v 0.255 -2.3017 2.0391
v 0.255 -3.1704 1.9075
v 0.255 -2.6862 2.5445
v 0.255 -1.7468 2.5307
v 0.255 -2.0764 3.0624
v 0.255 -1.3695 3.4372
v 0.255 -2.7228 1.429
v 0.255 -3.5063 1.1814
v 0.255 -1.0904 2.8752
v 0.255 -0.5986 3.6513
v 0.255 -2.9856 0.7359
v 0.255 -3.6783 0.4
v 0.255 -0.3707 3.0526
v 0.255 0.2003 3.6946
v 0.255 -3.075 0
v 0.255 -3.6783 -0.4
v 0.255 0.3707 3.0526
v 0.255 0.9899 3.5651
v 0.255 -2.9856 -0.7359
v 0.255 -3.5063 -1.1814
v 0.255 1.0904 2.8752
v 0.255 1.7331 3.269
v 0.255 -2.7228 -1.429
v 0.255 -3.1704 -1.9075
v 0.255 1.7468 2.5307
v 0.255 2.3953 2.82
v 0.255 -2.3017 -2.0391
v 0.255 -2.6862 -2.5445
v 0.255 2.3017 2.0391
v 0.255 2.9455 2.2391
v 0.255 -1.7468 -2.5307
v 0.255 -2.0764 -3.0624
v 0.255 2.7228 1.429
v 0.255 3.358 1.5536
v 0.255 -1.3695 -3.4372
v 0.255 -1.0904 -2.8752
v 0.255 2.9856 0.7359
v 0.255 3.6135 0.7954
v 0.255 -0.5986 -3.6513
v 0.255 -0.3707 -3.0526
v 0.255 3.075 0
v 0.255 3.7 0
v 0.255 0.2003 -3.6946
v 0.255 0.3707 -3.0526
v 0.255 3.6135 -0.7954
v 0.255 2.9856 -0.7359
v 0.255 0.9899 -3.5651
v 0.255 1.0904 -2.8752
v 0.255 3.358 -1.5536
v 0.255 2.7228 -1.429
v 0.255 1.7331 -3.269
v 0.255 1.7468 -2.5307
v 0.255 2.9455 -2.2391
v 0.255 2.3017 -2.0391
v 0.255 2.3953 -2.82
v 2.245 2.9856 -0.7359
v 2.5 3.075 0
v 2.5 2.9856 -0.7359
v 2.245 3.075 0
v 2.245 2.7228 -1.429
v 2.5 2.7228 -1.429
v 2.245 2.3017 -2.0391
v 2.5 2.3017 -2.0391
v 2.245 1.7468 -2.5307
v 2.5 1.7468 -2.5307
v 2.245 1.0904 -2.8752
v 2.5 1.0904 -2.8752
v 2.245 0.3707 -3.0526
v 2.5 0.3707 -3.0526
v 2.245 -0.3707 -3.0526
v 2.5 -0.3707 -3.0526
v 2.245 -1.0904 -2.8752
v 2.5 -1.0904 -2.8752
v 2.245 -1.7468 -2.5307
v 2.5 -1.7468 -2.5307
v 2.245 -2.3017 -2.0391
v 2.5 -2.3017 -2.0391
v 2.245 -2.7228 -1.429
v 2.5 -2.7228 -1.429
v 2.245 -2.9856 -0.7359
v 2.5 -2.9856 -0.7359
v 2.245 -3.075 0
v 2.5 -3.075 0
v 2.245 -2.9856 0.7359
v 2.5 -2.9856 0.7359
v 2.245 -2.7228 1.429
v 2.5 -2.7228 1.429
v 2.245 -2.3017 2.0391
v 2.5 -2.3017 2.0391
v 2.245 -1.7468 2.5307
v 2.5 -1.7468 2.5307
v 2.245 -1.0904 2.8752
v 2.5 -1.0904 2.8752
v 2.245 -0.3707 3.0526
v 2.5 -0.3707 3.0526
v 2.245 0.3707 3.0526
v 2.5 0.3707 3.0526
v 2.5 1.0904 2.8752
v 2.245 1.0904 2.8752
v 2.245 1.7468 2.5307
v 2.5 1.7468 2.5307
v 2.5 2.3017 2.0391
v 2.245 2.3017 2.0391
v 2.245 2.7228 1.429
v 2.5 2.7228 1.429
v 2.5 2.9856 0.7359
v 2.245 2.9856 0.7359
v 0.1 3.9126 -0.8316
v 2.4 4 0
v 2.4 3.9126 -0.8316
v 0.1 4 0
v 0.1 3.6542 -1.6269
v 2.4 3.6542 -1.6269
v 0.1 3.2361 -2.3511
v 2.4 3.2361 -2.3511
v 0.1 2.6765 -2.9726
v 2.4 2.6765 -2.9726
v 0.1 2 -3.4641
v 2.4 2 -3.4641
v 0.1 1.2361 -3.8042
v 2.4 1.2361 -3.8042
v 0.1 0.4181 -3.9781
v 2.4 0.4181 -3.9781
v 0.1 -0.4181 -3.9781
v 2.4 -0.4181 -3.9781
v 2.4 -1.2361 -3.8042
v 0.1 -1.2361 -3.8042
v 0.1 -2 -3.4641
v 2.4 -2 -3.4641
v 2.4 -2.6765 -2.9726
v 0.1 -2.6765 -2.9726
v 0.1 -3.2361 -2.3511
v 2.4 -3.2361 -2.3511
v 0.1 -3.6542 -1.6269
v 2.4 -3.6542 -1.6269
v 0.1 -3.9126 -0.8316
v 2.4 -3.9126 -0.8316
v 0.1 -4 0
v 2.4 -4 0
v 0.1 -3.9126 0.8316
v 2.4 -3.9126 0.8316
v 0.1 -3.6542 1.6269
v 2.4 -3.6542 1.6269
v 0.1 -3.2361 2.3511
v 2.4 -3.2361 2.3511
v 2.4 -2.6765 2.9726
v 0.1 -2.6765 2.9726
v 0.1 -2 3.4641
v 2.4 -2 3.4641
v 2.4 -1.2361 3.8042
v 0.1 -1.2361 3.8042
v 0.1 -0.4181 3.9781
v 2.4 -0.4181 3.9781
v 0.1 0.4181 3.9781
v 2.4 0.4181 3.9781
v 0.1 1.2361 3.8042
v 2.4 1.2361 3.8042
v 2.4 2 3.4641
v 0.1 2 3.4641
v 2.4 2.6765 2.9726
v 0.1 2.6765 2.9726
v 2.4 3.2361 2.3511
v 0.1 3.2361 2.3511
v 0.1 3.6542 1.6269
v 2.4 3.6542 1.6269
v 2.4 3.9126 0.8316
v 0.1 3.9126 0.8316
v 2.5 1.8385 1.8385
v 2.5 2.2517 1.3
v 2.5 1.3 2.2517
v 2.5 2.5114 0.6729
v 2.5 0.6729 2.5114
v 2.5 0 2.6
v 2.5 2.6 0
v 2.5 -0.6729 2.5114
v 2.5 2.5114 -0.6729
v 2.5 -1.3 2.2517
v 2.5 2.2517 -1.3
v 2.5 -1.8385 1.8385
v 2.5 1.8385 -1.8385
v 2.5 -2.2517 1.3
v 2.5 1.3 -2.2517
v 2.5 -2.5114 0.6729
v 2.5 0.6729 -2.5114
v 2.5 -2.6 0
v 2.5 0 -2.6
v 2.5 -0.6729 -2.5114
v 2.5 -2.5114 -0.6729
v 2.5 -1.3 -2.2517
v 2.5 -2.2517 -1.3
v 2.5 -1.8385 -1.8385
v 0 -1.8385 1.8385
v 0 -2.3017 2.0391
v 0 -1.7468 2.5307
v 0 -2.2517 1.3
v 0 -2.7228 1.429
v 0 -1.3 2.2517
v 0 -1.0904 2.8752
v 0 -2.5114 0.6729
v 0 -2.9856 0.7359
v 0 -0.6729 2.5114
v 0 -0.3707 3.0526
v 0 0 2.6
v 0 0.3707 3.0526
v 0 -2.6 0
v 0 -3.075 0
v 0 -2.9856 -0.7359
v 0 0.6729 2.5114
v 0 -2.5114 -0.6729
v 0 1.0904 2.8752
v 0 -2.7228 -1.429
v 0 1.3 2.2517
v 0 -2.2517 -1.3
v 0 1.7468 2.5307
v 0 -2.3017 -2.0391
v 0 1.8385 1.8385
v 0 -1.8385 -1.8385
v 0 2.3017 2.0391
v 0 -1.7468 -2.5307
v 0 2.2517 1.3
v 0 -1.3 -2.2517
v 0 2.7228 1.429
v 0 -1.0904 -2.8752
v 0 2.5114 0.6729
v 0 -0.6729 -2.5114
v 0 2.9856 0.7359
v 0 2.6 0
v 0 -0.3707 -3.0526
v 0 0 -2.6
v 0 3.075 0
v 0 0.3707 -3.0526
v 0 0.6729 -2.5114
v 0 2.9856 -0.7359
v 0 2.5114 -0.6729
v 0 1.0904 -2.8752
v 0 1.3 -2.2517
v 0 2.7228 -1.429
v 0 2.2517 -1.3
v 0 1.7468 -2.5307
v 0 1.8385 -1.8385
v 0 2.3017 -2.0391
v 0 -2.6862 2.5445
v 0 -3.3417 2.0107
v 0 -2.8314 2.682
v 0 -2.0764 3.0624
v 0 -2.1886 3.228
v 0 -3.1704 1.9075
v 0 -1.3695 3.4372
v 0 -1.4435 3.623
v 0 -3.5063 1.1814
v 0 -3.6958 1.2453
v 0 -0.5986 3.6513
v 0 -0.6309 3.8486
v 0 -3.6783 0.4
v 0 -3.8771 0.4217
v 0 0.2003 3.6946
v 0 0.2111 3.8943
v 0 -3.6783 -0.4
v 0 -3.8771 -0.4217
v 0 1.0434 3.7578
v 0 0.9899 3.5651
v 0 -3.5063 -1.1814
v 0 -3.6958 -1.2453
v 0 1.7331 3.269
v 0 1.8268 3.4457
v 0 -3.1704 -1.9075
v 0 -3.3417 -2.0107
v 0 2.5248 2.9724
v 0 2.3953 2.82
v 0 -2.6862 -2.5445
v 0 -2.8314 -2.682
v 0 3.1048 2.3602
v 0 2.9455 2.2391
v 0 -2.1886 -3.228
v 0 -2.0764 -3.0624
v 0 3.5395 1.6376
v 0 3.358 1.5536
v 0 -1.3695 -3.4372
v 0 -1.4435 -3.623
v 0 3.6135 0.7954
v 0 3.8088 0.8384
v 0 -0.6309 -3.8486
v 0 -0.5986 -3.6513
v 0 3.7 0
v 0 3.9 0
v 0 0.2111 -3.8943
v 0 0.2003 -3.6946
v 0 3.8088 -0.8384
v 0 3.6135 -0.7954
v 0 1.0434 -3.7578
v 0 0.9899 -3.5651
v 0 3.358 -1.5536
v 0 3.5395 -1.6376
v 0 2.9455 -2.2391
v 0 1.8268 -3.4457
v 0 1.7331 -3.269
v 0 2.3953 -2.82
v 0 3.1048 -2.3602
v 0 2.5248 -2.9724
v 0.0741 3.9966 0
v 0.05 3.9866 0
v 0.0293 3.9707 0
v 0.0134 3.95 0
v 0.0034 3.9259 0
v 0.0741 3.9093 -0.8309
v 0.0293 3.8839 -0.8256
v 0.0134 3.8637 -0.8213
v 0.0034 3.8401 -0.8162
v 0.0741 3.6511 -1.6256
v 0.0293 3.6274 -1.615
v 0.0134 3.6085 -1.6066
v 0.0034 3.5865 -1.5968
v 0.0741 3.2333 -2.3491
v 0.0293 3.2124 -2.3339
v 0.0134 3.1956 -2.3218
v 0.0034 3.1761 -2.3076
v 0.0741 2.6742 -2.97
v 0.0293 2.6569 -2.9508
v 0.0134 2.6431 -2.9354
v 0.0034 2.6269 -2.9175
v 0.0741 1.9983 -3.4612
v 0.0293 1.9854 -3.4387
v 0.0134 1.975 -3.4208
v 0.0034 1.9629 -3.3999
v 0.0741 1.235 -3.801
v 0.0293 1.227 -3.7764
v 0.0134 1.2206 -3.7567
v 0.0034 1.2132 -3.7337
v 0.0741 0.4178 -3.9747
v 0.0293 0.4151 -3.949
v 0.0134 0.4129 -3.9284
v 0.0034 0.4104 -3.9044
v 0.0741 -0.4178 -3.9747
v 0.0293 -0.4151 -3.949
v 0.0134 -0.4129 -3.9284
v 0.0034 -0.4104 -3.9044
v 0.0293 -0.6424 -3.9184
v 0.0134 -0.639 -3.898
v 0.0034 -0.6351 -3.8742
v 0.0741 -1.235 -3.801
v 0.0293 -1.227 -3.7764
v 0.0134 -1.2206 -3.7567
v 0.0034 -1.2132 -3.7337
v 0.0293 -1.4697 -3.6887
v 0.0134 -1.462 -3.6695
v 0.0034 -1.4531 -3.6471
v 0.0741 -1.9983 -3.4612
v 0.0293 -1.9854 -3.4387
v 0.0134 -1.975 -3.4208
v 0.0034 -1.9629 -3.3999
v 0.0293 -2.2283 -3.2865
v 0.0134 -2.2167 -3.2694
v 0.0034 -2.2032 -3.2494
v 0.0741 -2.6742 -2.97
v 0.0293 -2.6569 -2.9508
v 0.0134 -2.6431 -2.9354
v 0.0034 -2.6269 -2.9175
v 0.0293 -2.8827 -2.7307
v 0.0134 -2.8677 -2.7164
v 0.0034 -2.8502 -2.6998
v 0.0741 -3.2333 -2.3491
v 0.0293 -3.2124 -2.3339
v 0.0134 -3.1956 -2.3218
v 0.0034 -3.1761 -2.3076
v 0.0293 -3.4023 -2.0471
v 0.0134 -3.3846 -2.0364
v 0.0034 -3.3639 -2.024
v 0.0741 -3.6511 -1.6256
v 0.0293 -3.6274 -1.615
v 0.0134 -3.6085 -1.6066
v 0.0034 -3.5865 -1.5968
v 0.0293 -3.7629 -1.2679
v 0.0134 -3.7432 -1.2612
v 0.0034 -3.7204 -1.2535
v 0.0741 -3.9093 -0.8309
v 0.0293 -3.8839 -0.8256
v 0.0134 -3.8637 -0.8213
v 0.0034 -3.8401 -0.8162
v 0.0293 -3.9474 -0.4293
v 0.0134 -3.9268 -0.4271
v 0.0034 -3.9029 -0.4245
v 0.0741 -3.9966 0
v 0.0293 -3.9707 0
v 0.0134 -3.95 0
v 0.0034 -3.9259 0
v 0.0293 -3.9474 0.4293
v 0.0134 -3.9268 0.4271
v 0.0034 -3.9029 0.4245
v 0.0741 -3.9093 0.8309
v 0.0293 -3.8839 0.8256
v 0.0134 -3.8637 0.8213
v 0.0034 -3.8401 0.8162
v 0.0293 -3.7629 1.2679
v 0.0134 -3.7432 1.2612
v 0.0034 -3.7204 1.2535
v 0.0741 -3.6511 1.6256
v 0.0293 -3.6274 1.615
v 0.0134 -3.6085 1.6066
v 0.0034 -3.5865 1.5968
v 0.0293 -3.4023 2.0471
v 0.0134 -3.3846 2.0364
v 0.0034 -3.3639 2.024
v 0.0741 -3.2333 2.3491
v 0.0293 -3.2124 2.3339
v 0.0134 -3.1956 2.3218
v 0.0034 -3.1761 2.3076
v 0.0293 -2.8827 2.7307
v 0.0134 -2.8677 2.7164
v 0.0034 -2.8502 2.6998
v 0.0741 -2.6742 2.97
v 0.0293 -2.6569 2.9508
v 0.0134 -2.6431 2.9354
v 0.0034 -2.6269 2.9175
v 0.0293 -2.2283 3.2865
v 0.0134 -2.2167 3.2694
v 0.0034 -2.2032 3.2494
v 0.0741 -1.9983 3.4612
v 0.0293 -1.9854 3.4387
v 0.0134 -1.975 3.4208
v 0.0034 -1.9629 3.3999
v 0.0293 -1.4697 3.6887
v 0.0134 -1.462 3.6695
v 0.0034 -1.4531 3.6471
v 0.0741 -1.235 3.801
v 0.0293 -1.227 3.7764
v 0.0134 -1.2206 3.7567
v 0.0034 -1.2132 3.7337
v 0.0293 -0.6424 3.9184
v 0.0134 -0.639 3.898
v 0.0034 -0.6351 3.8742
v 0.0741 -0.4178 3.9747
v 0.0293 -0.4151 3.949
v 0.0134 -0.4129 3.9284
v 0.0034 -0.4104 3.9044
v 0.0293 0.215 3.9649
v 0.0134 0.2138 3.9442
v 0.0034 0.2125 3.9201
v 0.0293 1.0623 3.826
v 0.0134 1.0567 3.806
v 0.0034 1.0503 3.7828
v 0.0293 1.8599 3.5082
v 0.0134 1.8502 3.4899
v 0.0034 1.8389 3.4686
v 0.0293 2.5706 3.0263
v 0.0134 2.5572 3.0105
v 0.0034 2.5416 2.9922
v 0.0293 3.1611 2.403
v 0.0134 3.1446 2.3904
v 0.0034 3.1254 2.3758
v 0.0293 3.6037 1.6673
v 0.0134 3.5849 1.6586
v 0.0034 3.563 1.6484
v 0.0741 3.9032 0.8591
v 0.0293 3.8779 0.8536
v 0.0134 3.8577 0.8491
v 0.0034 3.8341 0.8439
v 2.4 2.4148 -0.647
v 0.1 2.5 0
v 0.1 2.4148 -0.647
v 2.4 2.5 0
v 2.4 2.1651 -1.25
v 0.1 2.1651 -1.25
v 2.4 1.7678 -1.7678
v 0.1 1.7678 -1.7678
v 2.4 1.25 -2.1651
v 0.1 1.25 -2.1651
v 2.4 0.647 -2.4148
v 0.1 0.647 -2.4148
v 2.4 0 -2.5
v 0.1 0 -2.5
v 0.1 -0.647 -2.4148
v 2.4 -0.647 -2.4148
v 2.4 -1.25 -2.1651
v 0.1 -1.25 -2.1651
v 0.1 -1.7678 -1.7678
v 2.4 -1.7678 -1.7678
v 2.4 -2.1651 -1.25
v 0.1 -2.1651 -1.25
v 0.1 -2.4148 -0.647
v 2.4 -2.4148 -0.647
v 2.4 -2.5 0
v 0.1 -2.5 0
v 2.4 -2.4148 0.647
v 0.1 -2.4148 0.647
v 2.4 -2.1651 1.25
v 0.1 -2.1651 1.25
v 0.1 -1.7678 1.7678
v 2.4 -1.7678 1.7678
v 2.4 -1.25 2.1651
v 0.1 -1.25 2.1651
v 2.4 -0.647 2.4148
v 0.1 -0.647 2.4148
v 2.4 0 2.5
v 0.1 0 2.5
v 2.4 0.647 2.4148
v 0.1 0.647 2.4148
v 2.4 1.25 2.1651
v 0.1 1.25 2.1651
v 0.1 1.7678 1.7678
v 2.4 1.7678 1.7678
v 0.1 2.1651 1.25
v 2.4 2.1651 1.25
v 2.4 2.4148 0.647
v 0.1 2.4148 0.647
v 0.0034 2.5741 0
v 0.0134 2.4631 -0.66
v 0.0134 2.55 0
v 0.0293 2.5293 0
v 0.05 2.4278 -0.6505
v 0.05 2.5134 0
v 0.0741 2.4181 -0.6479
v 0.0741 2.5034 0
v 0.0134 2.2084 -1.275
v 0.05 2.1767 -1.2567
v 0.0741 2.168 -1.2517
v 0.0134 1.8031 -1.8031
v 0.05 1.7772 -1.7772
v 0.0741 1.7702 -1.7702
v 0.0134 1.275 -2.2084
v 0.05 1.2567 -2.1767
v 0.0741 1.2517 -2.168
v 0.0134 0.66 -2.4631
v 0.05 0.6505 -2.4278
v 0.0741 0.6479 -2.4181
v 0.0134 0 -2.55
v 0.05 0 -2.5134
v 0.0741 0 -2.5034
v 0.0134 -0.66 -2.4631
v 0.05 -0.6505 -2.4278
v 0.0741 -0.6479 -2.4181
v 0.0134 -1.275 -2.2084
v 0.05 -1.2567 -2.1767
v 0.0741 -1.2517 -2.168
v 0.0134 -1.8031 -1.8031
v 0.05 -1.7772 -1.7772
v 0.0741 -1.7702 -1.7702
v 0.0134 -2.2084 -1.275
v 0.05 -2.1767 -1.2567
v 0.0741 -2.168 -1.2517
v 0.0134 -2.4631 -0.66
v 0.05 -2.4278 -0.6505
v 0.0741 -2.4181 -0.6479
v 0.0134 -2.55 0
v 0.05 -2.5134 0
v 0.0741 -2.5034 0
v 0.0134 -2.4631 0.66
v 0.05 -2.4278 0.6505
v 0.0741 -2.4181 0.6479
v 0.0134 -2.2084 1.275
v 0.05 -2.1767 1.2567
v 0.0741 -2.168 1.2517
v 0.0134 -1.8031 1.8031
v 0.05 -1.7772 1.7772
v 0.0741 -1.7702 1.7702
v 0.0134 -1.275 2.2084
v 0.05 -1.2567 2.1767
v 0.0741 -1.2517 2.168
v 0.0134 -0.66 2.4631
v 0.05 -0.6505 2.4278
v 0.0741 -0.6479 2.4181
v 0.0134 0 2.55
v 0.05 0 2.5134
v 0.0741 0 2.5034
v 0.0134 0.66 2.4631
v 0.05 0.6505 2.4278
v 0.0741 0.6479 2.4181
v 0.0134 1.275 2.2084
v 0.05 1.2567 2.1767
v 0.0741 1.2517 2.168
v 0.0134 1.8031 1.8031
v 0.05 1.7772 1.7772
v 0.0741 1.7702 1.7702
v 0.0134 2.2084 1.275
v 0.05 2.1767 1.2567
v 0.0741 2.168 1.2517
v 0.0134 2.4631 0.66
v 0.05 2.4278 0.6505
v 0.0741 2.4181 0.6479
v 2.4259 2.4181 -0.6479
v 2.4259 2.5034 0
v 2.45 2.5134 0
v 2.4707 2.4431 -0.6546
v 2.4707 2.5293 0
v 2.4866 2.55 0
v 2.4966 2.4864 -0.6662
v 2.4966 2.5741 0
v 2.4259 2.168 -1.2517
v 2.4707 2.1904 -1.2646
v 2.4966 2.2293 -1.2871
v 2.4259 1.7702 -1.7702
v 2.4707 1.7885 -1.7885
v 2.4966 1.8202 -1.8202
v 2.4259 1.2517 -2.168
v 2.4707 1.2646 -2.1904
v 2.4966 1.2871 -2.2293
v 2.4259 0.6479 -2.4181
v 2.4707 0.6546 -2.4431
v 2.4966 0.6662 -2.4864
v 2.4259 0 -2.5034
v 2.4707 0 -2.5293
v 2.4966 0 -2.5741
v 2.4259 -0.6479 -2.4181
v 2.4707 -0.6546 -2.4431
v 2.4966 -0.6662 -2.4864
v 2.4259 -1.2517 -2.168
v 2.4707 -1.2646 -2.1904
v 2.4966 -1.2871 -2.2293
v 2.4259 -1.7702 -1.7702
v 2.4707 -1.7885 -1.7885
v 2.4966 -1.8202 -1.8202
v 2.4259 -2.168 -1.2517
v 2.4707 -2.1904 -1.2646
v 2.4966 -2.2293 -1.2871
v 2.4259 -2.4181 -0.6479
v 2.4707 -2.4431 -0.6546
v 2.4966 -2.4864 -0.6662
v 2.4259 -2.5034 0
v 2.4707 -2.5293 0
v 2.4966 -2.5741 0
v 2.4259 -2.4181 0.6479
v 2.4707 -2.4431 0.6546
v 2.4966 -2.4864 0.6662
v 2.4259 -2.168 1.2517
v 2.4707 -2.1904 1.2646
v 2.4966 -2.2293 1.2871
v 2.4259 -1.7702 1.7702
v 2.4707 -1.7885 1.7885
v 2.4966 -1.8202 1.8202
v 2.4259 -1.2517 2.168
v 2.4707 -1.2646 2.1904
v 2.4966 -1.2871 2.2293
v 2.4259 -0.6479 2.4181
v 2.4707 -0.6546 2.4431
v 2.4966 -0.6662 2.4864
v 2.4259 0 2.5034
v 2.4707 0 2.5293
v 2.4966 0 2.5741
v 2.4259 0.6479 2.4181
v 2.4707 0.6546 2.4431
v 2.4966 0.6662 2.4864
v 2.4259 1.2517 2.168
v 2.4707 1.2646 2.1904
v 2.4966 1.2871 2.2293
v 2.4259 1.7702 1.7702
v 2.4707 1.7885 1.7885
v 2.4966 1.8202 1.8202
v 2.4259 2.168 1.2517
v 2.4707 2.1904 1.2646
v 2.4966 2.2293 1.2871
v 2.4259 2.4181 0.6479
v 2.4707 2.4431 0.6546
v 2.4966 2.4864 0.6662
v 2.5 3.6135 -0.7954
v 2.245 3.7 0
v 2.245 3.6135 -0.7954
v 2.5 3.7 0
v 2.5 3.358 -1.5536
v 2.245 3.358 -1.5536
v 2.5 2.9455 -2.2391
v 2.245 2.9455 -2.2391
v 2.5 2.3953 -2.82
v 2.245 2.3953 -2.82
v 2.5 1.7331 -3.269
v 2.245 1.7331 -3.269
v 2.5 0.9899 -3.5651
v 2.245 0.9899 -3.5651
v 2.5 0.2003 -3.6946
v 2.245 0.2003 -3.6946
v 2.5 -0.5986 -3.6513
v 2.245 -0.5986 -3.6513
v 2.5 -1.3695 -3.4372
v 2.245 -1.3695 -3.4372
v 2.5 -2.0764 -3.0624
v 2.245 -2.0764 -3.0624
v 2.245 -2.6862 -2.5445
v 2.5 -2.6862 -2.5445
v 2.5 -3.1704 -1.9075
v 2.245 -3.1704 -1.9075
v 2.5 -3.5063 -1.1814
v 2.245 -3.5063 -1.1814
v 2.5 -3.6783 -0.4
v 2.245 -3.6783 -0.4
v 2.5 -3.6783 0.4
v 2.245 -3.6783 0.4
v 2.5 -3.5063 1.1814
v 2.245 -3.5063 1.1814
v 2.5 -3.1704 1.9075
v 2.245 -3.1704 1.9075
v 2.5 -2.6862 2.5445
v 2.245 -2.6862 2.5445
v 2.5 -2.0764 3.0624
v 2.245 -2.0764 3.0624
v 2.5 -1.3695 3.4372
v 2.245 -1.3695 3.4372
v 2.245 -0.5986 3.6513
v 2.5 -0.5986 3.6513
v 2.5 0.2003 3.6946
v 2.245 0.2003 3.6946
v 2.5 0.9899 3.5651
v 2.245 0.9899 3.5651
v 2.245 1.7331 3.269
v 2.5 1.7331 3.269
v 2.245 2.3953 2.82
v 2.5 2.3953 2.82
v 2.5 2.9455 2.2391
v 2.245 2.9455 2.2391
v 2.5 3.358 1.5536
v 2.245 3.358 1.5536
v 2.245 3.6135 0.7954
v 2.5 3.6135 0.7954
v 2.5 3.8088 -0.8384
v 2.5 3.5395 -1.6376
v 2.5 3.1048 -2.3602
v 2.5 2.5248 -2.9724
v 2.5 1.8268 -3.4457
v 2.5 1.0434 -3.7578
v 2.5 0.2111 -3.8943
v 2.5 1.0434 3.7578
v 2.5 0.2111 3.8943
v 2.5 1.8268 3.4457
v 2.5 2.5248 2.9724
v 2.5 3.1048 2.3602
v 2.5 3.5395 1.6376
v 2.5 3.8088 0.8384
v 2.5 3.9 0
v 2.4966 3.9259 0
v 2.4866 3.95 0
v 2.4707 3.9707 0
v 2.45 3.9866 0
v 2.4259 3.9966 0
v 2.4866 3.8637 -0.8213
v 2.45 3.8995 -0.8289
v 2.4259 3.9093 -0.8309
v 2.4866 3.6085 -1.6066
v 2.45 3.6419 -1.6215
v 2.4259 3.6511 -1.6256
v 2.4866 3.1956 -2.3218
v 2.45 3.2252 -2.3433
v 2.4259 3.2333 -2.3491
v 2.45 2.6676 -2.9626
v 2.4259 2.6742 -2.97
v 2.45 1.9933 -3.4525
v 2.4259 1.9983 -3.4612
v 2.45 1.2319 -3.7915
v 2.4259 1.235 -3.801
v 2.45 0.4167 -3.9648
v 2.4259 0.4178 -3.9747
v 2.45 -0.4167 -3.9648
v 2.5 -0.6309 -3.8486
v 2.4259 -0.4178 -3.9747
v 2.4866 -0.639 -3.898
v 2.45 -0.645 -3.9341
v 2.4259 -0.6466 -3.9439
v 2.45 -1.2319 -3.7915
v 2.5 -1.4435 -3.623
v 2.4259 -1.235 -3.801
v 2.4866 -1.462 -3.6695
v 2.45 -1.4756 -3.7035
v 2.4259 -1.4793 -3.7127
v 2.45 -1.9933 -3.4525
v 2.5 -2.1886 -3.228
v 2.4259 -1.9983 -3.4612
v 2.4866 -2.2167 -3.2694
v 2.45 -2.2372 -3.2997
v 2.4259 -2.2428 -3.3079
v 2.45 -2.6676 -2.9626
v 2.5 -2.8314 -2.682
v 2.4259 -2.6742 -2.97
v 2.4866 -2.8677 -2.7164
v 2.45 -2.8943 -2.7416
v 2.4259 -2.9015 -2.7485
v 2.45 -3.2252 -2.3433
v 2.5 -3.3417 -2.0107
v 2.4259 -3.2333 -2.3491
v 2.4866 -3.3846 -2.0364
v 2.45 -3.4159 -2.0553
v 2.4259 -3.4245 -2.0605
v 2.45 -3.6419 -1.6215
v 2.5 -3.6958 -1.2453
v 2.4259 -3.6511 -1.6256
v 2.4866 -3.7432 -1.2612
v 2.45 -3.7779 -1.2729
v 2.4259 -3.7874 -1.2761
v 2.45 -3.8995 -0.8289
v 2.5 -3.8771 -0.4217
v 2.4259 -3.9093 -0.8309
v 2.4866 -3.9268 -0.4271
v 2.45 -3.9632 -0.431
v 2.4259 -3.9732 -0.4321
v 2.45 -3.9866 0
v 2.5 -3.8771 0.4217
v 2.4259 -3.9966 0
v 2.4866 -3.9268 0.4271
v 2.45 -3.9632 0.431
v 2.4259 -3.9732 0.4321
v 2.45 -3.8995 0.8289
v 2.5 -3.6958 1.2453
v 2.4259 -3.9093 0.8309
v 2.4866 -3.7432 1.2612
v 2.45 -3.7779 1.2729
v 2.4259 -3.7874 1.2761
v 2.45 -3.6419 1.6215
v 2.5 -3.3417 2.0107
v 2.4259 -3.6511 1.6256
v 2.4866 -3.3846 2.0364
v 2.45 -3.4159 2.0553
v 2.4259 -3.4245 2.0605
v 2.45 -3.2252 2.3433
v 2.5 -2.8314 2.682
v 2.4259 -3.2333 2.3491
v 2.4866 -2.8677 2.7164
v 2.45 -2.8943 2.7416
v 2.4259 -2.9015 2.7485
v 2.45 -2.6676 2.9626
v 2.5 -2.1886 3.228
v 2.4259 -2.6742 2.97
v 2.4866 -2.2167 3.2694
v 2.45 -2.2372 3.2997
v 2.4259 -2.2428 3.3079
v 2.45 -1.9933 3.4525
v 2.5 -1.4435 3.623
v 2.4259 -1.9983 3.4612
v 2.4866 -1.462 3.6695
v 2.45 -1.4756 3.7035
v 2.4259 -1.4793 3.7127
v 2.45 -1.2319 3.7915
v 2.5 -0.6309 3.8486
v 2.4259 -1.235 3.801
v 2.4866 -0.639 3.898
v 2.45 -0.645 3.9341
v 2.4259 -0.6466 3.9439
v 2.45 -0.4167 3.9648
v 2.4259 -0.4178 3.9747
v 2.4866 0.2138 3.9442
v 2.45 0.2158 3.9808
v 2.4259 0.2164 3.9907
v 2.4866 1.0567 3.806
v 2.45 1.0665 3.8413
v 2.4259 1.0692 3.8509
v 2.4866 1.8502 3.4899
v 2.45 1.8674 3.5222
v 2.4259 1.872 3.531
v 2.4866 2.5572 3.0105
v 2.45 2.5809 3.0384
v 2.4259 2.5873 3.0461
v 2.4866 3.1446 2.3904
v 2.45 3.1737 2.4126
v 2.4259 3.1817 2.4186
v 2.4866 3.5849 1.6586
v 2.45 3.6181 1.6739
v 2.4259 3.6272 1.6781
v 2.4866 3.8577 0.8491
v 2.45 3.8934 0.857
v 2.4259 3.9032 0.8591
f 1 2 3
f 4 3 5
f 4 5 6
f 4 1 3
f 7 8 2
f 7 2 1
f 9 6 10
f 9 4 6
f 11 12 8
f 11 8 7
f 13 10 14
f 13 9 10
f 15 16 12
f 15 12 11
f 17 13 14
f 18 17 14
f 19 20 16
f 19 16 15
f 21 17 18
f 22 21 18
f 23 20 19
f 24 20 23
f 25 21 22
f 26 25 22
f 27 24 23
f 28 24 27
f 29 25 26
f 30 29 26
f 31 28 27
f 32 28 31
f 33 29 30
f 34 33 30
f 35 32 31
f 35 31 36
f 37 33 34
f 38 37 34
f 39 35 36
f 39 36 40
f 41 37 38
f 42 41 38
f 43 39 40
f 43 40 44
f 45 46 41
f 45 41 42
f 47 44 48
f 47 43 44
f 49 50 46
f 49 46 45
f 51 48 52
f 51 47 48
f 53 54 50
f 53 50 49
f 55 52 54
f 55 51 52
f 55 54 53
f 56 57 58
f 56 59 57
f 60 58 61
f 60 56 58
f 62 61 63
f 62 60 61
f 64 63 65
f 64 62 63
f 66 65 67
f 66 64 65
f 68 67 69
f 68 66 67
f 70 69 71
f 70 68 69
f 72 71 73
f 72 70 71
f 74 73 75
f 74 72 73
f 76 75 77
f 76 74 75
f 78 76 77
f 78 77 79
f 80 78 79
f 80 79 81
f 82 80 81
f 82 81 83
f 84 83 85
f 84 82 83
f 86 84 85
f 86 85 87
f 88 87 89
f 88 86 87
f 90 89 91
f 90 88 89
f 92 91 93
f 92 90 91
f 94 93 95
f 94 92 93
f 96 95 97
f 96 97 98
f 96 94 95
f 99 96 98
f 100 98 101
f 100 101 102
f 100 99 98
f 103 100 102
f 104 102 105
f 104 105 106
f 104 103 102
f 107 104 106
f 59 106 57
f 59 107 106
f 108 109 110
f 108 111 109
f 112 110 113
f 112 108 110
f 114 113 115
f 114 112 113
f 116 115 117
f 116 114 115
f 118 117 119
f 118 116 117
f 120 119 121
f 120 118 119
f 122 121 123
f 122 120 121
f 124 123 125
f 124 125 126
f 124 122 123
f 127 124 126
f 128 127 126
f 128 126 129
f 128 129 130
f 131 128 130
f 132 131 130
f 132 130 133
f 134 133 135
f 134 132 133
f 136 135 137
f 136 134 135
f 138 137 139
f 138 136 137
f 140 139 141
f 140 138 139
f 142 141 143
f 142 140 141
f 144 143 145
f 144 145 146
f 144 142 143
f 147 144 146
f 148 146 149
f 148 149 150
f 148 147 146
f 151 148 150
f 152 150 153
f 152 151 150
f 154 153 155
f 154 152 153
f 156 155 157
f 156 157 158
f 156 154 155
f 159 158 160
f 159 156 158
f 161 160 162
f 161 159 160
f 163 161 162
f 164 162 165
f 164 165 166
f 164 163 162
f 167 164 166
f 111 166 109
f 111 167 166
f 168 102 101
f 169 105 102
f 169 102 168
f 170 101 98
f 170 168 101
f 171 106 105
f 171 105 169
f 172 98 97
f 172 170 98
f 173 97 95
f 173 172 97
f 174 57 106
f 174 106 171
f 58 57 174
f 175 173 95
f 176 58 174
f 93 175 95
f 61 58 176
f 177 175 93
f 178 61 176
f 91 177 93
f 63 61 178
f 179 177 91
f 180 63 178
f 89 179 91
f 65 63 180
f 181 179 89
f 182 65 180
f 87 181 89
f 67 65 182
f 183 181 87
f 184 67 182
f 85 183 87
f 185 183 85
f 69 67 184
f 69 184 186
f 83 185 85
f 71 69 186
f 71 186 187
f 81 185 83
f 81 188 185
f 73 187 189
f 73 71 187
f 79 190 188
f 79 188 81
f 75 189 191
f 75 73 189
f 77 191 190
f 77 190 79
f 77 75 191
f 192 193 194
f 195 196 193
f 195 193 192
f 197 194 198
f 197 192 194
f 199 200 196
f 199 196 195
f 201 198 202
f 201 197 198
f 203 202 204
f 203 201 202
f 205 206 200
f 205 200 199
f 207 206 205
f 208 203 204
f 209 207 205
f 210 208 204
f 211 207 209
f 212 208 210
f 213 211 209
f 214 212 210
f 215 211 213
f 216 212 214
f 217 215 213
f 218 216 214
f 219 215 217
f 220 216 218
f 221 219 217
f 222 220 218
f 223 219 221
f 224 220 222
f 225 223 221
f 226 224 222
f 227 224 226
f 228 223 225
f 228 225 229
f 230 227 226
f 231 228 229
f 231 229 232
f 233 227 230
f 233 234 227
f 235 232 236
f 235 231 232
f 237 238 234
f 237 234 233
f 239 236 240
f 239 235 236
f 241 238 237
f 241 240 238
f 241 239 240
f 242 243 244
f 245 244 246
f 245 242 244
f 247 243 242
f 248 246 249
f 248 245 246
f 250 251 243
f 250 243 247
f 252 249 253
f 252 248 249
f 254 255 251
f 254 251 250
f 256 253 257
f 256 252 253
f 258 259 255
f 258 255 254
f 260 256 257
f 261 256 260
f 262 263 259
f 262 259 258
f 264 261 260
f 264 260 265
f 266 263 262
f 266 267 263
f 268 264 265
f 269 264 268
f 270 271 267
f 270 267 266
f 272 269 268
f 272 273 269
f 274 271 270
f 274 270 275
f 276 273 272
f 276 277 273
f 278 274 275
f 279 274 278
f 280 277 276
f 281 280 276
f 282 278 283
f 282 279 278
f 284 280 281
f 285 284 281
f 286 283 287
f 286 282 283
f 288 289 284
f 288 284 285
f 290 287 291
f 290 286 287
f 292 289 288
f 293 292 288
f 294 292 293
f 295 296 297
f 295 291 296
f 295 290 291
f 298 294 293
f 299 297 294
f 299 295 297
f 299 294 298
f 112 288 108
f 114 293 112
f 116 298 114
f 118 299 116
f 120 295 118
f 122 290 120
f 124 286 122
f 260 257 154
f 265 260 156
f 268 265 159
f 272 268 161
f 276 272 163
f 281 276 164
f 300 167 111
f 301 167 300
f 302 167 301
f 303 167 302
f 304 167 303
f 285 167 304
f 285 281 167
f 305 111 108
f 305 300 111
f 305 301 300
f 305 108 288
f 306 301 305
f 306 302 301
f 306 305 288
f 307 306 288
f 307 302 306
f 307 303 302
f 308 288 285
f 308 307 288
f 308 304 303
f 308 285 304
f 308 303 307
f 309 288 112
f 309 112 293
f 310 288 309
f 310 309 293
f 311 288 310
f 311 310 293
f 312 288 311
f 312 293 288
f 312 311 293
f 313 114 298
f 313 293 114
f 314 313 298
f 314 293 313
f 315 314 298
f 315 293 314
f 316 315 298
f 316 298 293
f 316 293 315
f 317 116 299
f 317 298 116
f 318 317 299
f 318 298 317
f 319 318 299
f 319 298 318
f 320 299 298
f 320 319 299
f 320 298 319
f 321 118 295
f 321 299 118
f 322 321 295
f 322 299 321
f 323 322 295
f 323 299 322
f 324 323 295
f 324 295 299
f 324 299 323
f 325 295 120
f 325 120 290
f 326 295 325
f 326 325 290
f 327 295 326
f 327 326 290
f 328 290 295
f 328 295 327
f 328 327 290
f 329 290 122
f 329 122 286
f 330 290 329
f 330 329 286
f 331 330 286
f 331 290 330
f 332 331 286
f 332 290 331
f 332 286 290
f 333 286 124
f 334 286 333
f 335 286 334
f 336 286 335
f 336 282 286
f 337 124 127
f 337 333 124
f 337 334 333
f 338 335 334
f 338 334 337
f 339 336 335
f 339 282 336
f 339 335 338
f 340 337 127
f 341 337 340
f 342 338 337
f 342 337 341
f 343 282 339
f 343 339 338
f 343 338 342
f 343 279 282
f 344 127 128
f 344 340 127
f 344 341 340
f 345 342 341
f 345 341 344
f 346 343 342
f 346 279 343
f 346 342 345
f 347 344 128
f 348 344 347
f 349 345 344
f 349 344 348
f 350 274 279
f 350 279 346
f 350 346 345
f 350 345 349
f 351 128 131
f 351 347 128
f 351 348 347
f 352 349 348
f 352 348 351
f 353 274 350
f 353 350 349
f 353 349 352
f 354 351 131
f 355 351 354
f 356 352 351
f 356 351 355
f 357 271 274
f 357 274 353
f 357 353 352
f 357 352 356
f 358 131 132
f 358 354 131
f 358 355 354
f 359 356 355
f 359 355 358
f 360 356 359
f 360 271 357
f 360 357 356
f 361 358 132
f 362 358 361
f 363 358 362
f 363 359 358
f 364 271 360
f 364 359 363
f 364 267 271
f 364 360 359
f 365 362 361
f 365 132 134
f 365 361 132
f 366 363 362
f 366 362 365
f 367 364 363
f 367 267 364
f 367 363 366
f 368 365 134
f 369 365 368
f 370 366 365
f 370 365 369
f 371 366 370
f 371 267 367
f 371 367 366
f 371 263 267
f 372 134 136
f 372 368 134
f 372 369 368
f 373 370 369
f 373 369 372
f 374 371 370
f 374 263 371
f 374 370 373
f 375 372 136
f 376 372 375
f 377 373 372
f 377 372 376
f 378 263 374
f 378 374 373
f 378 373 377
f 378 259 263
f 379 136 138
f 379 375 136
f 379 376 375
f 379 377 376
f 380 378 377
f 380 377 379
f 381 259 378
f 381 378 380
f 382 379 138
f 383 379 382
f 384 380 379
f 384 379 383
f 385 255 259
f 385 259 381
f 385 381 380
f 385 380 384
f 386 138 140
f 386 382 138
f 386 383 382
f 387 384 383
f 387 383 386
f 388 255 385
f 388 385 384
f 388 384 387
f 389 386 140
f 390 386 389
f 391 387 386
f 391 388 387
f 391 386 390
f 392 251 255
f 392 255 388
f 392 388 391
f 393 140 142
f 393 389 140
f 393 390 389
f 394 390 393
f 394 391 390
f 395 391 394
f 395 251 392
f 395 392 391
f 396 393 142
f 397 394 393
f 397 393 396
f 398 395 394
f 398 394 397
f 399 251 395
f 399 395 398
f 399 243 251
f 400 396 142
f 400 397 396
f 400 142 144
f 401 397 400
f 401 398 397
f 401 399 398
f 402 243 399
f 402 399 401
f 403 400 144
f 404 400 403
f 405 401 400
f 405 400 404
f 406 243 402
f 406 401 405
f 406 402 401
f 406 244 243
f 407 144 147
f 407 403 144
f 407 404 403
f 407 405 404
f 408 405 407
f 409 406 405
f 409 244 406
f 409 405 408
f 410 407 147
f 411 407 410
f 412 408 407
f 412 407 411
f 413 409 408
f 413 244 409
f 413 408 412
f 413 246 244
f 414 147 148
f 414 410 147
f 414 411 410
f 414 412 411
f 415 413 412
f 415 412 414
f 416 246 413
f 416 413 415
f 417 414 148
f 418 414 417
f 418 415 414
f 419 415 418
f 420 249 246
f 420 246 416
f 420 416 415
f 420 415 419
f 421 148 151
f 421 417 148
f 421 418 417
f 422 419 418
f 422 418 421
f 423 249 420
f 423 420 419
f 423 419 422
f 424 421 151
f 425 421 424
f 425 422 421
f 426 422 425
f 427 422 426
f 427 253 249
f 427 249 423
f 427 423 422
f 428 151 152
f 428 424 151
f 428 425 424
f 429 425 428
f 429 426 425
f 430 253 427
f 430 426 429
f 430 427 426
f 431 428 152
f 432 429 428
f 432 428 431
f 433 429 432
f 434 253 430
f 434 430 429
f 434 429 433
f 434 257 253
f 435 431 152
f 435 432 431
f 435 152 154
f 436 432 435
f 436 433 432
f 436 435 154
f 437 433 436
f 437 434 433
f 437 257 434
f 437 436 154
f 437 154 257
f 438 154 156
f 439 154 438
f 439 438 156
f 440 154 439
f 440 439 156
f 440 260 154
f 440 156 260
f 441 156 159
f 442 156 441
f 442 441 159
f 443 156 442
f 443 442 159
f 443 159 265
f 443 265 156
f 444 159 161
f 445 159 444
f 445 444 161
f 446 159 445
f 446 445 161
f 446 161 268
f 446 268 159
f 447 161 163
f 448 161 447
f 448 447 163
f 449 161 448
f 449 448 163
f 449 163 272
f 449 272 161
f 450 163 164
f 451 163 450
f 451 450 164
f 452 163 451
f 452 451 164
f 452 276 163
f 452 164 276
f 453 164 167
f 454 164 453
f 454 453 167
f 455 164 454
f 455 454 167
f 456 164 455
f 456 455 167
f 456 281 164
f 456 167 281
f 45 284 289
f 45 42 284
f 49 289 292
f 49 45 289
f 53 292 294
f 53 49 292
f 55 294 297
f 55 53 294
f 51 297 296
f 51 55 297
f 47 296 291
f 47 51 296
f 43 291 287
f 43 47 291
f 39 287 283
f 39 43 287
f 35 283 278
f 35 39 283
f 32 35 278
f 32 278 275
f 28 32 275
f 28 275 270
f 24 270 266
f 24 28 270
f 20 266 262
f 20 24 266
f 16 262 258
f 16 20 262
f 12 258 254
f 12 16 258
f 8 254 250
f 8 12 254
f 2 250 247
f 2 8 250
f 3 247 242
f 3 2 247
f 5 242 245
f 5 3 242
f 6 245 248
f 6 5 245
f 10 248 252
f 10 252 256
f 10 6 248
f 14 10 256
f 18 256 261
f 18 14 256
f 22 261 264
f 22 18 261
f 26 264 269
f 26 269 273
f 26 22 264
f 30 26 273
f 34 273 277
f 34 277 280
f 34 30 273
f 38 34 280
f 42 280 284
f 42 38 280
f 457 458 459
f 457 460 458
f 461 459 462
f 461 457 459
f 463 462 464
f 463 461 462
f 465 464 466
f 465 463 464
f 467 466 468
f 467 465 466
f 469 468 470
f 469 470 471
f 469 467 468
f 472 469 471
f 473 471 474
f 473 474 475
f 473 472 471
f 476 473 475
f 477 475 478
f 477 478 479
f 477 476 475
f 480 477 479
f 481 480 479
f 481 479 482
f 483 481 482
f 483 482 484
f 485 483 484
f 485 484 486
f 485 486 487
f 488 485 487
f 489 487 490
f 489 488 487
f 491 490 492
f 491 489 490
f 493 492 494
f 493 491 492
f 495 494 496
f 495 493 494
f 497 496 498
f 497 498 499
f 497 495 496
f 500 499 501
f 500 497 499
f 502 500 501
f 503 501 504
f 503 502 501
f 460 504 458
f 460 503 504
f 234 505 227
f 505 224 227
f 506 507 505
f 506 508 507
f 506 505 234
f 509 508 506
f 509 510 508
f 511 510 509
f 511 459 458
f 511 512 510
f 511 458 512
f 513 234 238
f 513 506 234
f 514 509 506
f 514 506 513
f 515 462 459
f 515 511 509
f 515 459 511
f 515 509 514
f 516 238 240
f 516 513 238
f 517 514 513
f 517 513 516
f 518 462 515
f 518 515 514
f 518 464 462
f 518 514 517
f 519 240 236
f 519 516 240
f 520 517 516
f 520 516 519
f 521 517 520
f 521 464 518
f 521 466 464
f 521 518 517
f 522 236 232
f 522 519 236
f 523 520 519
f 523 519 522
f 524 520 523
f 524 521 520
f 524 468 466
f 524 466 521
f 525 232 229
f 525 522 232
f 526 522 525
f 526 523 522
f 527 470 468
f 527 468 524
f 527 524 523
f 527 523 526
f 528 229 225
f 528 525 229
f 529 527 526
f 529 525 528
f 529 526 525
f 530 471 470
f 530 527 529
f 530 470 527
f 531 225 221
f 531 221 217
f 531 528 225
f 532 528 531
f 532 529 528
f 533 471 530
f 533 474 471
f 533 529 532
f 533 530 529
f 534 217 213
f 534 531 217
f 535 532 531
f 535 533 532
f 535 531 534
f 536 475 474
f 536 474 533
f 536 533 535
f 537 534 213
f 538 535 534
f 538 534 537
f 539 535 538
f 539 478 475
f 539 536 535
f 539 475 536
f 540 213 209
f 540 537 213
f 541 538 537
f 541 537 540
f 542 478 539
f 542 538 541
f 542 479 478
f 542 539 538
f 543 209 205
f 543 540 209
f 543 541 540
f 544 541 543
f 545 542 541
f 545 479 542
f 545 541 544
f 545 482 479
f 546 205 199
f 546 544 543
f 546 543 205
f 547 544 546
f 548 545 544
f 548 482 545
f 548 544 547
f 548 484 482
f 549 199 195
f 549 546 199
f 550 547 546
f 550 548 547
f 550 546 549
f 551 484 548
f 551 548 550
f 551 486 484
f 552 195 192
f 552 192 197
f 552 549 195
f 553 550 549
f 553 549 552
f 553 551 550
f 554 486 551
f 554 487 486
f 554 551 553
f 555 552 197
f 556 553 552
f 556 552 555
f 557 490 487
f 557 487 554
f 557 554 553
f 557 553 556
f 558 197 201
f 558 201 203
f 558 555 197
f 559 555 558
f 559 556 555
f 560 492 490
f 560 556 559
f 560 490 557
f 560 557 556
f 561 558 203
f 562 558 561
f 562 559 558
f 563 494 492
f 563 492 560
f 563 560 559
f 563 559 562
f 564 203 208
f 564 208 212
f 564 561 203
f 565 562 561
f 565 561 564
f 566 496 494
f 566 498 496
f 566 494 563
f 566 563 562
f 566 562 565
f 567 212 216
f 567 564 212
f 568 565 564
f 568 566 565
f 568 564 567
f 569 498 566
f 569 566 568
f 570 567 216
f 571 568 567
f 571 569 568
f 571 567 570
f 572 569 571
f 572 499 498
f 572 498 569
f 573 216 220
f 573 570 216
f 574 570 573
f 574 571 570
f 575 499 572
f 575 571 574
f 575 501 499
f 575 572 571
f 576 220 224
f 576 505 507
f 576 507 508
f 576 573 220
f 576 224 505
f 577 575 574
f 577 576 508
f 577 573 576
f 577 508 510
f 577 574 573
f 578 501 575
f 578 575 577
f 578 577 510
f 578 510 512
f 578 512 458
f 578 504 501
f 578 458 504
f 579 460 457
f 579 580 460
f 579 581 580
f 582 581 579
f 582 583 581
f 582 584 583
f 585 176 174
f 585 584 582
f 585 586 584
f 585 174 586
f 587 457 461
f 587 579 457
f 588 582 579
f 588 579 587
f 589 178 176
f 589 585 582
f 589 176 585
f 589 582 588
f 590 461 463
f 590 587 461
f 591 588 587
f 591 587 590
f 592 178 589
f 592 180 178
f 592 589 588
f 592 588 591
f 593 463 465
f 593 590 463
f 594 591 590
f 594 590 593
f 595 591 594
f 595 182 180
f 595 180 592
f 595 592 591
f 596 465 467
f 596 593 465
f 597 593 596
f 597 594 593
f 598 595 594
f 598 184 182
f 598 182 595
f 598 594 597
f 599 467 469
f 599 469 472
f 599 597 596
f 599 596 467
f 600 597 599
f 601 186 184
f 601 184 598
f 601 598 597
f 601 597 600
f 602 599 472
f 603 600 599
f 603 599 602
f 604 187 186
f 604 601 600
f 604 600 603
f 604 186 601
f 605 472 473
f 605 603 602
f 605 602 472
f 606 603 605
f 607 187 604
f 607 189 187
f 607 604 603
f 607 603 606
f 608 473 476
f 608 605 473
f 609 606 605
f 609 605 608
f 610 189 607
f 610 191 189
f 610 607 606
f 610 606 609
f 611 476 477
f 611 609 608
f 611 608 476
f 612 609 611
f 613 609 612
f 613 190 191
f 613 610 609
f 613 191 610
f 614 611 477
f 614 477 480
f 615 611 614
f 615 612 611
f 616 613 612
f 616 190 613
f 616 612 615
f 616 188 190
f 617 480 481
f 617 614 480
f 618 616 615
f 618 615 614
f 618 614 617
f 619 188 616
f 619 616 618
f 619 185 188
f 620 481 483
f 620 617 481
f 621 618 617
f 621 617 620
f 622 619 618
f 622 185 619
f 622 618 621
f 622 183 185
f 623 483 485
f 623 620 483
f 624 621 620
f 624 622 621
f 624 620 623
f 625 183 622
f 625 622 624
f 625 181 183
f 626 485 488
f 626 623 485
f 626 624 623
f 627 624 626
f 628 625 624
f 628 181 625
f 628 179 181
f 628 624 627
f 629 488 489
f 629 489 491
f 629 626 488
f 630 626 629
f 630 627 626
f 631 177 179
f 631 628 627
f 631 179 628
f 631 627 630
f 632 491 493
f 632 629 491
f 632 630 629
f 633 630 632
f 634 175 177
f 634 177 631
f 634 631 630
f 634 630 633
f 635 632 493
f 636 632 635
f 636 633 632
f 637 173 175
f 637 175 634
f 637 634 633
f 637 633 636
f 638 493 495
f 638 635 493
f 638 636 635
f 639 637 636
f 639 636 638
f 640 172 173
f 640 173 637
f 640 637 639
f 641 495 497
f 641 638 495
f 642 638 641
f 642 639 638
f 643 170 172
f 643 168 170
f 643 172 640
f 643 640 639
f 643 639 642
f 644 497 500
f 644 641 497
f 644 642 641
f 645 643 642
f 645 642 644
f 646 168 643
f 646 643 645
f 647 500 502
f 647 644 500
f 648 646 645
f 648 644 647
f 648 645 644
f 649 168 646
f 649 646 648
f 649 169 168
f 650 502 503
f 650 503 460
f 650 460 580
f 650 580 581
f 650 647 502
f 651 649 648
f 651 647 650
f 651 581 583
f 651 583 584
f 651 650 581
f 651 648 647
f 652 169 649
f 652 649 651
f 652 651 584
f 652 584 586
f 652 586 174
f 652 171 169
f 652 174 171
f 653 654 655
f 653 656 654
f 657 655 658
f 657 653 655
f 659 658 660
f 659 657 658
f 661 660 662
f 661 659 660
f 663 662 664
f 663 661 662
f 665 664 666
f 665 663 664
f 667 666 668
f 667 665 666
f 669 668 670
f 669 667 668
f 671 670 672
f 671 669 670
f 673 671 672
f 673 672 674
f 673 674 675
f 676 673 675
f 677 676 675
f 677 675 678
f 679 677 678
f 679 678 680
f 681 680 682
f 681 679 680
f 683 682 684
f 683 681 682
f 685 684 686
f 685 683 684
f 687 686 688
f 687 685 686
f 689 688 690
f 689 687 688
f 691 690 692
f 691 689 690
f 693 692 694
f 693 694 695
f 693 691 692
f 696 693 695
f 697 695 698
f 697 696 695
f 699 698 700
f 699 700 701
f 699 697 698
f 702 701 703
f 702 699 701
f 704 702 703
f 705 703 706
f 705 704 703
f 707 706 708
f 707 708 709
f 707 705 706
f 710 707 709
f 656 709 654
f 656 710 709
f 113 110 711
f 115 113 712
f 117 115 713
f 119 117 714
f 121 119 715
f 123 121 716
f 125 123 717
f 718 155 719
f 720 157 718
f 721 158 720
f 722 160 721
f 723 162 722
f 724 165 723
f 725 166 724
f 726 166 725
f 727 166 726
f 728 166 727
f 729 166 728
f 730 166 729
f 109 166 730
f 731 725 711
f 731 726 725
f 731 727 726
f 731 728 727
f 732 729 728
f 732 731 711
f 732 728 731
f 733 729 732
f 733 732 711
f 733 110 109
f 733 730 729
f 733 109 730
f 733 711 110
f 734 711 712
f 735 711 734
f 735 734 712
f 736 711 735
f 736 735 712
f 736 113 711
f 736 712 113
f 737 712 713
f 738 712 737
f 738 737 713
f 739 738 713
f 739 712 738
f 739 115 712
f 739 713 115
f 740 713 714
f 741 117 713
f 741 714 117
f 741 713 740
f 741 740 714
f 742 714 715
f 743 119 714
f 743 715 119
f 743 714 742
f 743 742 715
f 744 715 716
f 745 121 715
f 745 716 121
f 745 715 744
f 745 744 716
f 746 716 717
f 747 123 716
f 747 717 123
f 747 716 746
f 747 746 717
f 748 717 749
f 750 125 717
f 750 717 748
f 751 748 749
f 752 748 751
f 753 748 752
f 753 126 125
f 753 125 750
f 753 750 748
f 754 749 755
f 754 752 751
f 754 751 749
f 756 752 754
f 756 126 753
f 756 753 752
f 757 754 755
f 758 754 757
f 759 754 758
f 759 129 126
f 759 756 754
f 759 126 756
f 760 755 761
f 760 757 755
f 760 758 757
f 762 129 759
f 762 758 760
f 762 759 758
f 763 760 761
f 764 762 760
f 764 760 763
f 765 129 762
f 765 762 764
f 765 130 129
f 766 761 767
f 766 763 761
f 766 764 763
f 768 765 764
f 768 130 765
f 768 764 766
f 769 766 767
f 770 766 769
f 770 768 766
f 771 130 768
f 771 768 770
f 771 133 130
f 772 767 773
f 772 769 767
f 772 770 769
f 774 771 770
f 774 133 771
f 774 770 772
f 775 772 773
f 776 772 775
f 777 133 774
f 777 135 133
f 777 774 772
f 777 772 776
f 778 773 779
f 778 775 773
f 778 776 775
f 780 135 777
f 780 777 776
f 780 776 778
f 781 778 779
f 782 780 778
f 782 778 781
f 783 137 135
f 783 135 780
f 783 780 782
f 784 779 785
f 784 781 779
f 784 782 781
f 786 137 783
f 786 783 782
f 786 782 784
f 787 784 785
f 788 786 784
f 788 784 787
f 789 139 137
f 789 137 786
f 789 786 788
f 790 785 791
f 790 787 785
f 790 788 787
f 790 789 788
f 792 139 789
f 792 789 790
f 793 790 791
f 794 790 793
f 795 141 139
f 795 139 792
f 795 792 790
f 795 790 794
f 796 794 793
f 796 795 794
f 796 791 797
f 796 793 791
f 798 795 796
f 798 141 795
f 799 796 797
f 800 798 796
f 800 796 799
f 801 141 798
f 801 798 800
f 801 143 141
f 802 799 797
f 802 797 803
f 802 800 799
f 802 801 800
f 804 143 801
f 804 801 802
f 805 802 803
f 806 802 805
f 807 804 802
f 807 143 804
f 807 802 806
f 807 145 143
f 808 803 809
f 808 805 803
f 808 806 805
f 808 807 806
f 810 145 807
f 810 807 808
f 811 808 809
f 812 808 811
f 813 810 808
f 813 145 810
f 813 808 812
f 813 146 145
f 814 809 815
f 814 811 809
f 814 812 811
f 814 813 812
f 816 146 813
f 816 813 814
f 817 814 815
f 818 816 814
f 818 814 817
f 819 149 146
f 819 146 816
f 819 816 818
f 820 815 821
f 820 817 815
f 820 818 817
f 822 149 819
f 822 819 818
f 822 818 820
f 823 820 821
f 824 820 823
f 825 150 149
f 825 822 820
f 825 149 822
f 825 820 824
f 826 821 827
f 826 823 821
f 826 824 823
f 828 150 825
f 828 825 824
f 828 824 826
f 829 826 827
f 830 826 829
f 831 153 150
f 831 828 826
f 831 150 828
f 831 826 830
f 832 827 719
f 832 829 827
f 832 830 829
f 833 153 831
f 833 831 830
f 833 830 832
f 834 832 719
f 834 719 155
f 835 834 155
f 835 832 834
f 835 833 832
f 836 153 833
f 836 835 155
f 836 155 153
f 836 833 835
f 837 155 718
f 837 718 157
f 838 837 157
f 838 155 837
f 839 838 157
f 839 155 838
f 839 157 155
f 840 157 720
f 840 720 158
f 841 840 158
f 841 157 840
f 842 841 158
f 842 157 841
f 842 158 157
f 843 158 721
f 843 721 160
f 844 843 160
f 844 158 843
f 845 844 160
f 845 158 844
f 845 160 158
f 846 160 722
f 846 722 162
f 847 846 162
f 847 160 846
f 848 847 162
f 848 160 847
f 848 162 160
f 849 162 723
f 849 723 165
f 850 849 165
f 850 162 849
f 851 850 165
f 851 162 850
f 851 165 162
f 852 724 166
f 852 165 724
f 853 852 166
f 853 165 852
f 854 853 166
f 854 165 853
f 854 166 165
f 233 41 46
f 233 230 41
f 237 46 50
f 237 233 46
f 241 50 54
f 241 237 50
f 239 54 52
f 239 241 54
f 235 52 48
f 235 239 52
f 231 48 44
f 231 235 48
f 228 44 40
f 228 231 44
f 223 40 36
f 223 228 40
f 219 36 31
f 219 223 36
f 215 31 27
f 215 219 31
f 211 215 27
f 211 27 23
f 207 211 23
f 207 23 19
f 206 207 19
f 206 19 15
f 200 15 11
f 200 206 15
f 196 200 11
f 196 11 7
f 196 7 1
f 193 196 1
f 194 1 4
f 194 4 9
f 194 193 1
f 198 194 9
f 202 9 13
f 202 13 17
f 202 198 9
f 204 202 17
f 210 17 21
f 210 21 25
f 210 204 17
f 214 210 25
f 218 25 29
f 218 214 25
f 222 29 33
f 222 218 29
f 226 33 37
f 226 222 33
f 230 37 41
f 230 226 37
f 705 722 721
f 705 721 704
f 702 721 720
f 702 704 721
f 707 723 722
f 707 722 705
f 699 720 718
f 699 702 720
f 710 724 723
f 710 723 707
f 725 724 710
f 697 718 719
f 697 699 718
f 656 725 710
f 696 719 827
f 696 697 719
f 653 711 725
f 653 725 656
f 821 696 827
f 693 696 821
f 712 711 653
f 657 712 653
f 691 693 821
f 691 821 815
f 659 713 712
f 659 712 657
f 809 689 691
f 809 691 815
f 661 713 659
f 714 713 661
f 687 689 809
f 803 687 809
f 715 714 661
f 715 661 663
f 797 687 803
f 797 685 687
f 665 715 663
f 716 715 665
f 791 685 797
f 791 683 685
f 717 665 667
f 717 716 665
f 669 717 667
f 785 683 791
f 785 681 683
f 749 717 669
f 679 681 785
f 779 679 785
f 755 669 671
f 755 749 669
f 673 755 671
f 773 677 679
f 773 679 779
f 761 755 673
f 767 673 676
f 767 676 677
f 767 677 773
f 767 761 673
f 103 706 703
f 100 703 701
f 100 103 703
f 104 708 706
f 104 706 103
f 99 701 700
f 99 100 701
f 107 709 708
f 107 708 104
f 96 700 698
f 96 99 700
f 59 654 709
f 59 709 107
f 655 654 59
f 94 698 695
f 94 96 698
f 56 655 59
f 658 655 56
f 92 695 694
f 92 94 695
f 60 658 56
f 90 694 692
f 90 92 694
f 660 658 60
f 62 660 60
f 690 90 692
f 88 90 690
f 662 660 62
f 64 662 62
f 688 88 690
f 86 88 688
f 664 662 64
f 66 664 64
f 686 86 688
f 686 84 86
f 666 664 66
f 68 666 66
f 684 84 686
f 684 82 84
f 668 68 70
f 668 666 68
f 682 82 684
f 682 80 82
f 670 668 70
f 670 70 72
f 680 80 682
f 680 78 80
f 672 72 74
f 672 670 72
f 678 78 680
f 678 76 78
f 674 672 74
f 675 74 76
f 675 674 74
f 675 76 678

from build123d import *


with BuildPart() as part:
    # Sketch1 → Revolve1 (revolve)
    with BuildSketch(Plane.XY):
        with BuildLine():
            Line((0, 3.9), (0, 3.7))
            Line((0, 3.7), (0.255, 3.7))
            Line((0.255, 3.7), (0.255, 3.075))
            Line((0.255, 3.075), (0, 3.075))
            Line((0, 3.075), (0, 2.6))
            ThreePointArc((0, 2.6), (0.029289322, 2.529289322), (0.1, 2.5))
            Line((0.1, 2.5), (2.4, 2.5))
            ThreePointArc((2.4, 2.5), (2.470710678, 2.529289322), (2.5, 2.6))
            Line((2.5, 2.6), (2.5, 3.075))
            Line((2.5, 3.075), (2.245, 3.075))
            Line((2.245, 3.075), (2.245, 3.7))
            Line((2.245, 3.7), (2.5, 3.7))
            Line((2.5, 3.7), (2.5, 3.9))
            ThreePointArc((2.5, 3.9), (2.470710678, 3.970710678), (2.4, 4))
            Line((2.4, 4), (0.1, 4))
            ThreePointArc((0.1, 4), (0.029289322, 3.970710678), (0, 3.9))
        make_face()
    revolve(axis=Axis((2.4, 0, 0), (-1, 0, 0)))


solid = part.part
